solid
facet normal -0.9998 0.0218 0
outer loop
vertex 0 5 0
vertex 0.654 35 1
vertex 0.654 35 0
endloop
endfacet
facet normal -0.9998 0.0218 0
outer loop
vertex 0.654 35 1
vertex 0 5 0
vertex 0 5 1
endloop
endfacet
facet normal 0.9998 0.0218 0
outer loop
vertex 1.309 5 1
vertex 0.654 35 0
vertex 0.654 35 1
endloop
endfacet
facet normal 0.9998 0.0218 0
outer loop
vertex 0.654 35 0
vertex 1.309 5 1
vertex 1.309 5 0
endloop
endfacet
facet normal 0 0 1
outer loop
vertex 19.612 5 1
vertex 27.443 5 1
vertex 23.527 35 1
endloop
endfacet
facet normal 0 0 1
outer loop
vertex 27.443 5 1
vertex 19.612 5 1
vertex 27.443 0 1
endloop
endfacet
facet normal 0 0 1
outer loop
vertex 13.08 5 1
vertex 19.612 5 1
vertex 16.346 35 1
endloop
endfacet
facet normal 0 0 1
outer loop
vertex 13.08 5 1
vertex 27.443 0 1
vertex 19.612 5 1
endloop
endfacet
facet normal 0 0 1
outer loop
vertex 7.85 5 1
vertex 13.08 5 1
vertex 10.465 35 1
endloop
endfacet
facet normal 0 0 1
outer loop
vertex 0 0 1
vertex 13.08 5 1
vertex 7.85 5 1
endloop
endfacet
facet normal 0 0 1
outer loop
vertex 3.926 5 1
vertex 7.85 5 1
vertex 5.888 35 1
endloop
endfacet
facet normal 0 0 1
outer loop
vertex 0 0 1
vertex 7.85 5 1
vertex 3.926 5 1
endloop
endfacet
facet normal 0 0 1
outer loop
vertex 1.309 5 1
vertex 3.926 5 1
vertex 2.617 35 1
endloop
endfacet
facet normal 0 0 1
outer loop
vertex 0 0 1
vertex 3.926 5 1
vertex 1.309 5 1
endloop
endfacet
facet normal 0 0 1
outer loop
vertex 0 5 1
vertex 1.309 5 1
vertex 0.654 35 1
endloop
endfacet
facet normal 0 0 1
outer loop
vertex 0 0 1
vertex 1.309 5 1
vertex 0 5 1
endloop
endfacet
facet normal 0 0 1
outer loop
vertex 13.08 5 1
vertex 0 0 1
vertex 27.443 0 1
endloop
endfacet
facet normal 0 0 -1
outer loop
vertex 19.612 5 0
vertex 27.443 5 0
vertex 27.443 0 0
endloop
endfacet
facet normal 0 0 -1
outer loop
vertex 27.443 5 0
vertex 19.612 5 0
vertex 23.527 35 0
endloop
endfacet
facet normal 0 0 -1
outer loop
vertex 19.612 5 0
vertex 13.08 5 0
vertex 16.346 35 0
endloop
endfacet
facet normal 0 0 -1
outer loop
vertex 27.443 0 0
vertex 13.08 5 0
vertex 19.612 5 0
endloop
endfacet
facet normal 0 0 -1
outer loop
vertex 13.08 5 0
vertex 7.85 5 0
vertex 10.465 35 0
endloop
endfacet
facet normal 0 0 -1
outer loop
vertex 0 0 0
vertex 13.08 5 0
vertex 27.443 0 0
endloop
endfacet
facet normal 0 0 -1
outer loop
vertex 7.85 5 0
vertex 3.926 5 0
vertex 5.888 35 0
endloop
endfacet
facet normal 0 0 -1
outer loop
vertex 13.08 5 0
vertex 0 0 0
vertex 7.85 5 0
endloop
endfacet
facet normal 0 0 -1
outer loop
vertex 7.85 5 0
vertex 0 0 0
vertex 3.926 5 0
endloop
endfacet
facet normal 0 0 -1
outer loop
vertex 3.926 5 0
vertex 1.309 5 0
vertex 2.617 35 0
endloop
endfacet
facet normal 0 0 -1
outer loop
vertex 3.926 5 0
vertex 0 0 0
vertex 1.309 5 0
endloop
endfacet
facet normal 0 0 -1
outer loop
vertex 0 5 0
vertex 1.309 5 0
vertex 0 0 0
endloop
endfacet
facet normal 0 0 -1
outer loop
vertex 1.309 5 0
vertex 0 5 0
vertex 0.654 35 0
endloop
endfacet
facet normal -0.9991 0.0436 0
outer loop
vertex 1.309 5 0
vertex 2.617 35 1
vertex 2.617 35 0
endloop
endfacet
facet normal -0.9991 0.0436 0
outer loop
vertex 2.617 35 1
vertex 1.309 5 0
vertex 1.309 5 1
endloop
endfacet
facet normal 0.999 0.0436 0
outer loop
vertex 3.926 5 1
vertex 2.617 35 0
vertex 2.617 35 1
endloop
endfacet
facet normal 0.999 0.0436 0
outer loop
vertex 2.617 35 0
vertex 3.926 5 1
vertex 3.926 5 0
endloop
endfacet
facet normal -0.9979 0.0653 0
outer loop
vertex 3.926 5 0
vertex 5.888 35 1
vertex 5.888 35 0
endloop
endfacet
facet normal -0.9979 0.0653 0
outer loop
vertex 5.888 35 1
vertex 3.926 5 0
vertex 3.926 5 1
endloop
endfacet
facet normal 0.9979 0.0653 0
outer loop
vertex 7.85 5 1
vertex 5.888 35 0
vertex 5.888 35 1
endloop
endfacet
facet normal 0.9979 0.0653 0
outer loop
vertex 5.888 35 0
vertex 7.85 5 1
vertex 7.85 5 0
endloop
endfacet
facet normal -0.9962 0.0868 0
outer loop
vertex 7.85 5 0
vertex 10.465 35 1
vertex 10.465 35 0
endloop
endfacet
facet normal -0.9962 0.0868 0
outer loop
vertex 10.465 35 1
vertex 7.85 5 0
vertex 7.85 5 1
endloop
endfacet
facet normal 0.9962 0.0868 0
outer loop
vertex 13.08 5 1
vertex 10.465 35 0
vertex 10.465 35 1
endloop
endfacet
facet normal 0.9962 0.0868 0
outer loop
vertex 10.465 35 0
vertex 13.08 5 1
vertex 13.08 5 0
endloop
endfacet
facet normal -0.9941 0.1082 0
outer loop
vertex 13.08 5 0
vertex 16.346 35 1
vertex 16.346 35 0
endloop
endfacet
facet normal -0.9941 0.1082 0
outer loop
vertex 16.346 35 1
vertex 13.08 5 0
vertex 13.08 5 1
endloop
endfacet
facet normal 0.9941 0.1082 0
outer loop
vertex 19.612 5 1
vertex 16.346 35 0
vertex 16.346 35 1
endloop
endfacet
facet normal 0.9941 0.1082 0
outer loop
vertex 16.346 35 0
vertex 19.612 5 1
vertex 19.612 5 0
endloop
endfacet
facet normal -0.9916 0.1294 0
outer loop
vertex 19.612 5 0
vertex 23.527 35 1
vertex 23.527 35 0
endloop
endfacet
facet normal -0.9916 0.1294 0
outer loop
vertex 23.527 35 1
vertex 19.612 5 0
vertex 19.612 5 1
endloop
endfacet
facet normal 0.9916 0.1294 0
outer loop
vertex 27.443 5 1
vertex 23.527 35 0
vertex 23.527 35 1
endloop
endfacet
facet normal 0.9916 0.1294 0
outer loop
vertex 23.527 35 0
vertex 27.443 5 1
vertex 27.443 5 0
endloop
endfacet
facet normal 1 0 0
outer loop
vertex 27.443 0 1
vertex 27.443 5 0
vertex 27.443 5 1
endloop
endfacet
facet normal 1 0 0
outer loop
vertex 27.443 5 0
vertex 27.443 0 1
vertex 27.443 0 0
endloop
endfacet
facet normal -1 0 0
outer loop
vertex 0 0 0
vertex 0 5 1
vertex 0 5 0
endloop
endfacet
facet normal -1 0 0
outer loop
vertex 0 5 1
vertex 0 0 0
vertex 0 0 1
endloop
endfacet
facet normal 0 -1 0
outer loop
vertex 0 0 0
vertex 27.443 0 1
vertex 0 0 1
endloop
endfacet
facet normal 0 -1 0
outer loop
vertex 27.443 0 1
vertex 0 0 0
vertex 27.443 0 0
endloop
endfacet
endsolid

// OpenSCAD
base_width = 5;
min_tooth = 2.5;
max_tooth = 15;
inc_tooth = 2.5;
tooth_size = 30;

function sum(list) = list ? [for(p = list) 1] * list : 0;

module tooth(angle) {
	width = sin(angle / 2) * tooth_size * 2;
	difference() {
		translate([width / 2, 0, 0]) {
			scale([width / 2 / tooth_size, 1, 1]) {
				cylinder(h=1, r=tooth_size, $fn=4);
			}
		}
		translate([0, -tooth_size, -1]) {
			cube([width, tooth_size, 3]);
		}
	}
}

cube([sum([for(prev_a = [min_tooth : inc_tooth : max_tooth]) sin(prev_a / 2) * 2 * tooth_size]), base_width, 1]);
for(a = [min_tooth : inc_tooth : max_tooth]) {
	x = sum([for(prev_a = [min_tooth : inc_tooth : a - inc_tooth]) sin(prev_a / 2) * 2 * tooth_size]);
	translate([x, base_width, 0]) {
		tooth(a);
	}
}
